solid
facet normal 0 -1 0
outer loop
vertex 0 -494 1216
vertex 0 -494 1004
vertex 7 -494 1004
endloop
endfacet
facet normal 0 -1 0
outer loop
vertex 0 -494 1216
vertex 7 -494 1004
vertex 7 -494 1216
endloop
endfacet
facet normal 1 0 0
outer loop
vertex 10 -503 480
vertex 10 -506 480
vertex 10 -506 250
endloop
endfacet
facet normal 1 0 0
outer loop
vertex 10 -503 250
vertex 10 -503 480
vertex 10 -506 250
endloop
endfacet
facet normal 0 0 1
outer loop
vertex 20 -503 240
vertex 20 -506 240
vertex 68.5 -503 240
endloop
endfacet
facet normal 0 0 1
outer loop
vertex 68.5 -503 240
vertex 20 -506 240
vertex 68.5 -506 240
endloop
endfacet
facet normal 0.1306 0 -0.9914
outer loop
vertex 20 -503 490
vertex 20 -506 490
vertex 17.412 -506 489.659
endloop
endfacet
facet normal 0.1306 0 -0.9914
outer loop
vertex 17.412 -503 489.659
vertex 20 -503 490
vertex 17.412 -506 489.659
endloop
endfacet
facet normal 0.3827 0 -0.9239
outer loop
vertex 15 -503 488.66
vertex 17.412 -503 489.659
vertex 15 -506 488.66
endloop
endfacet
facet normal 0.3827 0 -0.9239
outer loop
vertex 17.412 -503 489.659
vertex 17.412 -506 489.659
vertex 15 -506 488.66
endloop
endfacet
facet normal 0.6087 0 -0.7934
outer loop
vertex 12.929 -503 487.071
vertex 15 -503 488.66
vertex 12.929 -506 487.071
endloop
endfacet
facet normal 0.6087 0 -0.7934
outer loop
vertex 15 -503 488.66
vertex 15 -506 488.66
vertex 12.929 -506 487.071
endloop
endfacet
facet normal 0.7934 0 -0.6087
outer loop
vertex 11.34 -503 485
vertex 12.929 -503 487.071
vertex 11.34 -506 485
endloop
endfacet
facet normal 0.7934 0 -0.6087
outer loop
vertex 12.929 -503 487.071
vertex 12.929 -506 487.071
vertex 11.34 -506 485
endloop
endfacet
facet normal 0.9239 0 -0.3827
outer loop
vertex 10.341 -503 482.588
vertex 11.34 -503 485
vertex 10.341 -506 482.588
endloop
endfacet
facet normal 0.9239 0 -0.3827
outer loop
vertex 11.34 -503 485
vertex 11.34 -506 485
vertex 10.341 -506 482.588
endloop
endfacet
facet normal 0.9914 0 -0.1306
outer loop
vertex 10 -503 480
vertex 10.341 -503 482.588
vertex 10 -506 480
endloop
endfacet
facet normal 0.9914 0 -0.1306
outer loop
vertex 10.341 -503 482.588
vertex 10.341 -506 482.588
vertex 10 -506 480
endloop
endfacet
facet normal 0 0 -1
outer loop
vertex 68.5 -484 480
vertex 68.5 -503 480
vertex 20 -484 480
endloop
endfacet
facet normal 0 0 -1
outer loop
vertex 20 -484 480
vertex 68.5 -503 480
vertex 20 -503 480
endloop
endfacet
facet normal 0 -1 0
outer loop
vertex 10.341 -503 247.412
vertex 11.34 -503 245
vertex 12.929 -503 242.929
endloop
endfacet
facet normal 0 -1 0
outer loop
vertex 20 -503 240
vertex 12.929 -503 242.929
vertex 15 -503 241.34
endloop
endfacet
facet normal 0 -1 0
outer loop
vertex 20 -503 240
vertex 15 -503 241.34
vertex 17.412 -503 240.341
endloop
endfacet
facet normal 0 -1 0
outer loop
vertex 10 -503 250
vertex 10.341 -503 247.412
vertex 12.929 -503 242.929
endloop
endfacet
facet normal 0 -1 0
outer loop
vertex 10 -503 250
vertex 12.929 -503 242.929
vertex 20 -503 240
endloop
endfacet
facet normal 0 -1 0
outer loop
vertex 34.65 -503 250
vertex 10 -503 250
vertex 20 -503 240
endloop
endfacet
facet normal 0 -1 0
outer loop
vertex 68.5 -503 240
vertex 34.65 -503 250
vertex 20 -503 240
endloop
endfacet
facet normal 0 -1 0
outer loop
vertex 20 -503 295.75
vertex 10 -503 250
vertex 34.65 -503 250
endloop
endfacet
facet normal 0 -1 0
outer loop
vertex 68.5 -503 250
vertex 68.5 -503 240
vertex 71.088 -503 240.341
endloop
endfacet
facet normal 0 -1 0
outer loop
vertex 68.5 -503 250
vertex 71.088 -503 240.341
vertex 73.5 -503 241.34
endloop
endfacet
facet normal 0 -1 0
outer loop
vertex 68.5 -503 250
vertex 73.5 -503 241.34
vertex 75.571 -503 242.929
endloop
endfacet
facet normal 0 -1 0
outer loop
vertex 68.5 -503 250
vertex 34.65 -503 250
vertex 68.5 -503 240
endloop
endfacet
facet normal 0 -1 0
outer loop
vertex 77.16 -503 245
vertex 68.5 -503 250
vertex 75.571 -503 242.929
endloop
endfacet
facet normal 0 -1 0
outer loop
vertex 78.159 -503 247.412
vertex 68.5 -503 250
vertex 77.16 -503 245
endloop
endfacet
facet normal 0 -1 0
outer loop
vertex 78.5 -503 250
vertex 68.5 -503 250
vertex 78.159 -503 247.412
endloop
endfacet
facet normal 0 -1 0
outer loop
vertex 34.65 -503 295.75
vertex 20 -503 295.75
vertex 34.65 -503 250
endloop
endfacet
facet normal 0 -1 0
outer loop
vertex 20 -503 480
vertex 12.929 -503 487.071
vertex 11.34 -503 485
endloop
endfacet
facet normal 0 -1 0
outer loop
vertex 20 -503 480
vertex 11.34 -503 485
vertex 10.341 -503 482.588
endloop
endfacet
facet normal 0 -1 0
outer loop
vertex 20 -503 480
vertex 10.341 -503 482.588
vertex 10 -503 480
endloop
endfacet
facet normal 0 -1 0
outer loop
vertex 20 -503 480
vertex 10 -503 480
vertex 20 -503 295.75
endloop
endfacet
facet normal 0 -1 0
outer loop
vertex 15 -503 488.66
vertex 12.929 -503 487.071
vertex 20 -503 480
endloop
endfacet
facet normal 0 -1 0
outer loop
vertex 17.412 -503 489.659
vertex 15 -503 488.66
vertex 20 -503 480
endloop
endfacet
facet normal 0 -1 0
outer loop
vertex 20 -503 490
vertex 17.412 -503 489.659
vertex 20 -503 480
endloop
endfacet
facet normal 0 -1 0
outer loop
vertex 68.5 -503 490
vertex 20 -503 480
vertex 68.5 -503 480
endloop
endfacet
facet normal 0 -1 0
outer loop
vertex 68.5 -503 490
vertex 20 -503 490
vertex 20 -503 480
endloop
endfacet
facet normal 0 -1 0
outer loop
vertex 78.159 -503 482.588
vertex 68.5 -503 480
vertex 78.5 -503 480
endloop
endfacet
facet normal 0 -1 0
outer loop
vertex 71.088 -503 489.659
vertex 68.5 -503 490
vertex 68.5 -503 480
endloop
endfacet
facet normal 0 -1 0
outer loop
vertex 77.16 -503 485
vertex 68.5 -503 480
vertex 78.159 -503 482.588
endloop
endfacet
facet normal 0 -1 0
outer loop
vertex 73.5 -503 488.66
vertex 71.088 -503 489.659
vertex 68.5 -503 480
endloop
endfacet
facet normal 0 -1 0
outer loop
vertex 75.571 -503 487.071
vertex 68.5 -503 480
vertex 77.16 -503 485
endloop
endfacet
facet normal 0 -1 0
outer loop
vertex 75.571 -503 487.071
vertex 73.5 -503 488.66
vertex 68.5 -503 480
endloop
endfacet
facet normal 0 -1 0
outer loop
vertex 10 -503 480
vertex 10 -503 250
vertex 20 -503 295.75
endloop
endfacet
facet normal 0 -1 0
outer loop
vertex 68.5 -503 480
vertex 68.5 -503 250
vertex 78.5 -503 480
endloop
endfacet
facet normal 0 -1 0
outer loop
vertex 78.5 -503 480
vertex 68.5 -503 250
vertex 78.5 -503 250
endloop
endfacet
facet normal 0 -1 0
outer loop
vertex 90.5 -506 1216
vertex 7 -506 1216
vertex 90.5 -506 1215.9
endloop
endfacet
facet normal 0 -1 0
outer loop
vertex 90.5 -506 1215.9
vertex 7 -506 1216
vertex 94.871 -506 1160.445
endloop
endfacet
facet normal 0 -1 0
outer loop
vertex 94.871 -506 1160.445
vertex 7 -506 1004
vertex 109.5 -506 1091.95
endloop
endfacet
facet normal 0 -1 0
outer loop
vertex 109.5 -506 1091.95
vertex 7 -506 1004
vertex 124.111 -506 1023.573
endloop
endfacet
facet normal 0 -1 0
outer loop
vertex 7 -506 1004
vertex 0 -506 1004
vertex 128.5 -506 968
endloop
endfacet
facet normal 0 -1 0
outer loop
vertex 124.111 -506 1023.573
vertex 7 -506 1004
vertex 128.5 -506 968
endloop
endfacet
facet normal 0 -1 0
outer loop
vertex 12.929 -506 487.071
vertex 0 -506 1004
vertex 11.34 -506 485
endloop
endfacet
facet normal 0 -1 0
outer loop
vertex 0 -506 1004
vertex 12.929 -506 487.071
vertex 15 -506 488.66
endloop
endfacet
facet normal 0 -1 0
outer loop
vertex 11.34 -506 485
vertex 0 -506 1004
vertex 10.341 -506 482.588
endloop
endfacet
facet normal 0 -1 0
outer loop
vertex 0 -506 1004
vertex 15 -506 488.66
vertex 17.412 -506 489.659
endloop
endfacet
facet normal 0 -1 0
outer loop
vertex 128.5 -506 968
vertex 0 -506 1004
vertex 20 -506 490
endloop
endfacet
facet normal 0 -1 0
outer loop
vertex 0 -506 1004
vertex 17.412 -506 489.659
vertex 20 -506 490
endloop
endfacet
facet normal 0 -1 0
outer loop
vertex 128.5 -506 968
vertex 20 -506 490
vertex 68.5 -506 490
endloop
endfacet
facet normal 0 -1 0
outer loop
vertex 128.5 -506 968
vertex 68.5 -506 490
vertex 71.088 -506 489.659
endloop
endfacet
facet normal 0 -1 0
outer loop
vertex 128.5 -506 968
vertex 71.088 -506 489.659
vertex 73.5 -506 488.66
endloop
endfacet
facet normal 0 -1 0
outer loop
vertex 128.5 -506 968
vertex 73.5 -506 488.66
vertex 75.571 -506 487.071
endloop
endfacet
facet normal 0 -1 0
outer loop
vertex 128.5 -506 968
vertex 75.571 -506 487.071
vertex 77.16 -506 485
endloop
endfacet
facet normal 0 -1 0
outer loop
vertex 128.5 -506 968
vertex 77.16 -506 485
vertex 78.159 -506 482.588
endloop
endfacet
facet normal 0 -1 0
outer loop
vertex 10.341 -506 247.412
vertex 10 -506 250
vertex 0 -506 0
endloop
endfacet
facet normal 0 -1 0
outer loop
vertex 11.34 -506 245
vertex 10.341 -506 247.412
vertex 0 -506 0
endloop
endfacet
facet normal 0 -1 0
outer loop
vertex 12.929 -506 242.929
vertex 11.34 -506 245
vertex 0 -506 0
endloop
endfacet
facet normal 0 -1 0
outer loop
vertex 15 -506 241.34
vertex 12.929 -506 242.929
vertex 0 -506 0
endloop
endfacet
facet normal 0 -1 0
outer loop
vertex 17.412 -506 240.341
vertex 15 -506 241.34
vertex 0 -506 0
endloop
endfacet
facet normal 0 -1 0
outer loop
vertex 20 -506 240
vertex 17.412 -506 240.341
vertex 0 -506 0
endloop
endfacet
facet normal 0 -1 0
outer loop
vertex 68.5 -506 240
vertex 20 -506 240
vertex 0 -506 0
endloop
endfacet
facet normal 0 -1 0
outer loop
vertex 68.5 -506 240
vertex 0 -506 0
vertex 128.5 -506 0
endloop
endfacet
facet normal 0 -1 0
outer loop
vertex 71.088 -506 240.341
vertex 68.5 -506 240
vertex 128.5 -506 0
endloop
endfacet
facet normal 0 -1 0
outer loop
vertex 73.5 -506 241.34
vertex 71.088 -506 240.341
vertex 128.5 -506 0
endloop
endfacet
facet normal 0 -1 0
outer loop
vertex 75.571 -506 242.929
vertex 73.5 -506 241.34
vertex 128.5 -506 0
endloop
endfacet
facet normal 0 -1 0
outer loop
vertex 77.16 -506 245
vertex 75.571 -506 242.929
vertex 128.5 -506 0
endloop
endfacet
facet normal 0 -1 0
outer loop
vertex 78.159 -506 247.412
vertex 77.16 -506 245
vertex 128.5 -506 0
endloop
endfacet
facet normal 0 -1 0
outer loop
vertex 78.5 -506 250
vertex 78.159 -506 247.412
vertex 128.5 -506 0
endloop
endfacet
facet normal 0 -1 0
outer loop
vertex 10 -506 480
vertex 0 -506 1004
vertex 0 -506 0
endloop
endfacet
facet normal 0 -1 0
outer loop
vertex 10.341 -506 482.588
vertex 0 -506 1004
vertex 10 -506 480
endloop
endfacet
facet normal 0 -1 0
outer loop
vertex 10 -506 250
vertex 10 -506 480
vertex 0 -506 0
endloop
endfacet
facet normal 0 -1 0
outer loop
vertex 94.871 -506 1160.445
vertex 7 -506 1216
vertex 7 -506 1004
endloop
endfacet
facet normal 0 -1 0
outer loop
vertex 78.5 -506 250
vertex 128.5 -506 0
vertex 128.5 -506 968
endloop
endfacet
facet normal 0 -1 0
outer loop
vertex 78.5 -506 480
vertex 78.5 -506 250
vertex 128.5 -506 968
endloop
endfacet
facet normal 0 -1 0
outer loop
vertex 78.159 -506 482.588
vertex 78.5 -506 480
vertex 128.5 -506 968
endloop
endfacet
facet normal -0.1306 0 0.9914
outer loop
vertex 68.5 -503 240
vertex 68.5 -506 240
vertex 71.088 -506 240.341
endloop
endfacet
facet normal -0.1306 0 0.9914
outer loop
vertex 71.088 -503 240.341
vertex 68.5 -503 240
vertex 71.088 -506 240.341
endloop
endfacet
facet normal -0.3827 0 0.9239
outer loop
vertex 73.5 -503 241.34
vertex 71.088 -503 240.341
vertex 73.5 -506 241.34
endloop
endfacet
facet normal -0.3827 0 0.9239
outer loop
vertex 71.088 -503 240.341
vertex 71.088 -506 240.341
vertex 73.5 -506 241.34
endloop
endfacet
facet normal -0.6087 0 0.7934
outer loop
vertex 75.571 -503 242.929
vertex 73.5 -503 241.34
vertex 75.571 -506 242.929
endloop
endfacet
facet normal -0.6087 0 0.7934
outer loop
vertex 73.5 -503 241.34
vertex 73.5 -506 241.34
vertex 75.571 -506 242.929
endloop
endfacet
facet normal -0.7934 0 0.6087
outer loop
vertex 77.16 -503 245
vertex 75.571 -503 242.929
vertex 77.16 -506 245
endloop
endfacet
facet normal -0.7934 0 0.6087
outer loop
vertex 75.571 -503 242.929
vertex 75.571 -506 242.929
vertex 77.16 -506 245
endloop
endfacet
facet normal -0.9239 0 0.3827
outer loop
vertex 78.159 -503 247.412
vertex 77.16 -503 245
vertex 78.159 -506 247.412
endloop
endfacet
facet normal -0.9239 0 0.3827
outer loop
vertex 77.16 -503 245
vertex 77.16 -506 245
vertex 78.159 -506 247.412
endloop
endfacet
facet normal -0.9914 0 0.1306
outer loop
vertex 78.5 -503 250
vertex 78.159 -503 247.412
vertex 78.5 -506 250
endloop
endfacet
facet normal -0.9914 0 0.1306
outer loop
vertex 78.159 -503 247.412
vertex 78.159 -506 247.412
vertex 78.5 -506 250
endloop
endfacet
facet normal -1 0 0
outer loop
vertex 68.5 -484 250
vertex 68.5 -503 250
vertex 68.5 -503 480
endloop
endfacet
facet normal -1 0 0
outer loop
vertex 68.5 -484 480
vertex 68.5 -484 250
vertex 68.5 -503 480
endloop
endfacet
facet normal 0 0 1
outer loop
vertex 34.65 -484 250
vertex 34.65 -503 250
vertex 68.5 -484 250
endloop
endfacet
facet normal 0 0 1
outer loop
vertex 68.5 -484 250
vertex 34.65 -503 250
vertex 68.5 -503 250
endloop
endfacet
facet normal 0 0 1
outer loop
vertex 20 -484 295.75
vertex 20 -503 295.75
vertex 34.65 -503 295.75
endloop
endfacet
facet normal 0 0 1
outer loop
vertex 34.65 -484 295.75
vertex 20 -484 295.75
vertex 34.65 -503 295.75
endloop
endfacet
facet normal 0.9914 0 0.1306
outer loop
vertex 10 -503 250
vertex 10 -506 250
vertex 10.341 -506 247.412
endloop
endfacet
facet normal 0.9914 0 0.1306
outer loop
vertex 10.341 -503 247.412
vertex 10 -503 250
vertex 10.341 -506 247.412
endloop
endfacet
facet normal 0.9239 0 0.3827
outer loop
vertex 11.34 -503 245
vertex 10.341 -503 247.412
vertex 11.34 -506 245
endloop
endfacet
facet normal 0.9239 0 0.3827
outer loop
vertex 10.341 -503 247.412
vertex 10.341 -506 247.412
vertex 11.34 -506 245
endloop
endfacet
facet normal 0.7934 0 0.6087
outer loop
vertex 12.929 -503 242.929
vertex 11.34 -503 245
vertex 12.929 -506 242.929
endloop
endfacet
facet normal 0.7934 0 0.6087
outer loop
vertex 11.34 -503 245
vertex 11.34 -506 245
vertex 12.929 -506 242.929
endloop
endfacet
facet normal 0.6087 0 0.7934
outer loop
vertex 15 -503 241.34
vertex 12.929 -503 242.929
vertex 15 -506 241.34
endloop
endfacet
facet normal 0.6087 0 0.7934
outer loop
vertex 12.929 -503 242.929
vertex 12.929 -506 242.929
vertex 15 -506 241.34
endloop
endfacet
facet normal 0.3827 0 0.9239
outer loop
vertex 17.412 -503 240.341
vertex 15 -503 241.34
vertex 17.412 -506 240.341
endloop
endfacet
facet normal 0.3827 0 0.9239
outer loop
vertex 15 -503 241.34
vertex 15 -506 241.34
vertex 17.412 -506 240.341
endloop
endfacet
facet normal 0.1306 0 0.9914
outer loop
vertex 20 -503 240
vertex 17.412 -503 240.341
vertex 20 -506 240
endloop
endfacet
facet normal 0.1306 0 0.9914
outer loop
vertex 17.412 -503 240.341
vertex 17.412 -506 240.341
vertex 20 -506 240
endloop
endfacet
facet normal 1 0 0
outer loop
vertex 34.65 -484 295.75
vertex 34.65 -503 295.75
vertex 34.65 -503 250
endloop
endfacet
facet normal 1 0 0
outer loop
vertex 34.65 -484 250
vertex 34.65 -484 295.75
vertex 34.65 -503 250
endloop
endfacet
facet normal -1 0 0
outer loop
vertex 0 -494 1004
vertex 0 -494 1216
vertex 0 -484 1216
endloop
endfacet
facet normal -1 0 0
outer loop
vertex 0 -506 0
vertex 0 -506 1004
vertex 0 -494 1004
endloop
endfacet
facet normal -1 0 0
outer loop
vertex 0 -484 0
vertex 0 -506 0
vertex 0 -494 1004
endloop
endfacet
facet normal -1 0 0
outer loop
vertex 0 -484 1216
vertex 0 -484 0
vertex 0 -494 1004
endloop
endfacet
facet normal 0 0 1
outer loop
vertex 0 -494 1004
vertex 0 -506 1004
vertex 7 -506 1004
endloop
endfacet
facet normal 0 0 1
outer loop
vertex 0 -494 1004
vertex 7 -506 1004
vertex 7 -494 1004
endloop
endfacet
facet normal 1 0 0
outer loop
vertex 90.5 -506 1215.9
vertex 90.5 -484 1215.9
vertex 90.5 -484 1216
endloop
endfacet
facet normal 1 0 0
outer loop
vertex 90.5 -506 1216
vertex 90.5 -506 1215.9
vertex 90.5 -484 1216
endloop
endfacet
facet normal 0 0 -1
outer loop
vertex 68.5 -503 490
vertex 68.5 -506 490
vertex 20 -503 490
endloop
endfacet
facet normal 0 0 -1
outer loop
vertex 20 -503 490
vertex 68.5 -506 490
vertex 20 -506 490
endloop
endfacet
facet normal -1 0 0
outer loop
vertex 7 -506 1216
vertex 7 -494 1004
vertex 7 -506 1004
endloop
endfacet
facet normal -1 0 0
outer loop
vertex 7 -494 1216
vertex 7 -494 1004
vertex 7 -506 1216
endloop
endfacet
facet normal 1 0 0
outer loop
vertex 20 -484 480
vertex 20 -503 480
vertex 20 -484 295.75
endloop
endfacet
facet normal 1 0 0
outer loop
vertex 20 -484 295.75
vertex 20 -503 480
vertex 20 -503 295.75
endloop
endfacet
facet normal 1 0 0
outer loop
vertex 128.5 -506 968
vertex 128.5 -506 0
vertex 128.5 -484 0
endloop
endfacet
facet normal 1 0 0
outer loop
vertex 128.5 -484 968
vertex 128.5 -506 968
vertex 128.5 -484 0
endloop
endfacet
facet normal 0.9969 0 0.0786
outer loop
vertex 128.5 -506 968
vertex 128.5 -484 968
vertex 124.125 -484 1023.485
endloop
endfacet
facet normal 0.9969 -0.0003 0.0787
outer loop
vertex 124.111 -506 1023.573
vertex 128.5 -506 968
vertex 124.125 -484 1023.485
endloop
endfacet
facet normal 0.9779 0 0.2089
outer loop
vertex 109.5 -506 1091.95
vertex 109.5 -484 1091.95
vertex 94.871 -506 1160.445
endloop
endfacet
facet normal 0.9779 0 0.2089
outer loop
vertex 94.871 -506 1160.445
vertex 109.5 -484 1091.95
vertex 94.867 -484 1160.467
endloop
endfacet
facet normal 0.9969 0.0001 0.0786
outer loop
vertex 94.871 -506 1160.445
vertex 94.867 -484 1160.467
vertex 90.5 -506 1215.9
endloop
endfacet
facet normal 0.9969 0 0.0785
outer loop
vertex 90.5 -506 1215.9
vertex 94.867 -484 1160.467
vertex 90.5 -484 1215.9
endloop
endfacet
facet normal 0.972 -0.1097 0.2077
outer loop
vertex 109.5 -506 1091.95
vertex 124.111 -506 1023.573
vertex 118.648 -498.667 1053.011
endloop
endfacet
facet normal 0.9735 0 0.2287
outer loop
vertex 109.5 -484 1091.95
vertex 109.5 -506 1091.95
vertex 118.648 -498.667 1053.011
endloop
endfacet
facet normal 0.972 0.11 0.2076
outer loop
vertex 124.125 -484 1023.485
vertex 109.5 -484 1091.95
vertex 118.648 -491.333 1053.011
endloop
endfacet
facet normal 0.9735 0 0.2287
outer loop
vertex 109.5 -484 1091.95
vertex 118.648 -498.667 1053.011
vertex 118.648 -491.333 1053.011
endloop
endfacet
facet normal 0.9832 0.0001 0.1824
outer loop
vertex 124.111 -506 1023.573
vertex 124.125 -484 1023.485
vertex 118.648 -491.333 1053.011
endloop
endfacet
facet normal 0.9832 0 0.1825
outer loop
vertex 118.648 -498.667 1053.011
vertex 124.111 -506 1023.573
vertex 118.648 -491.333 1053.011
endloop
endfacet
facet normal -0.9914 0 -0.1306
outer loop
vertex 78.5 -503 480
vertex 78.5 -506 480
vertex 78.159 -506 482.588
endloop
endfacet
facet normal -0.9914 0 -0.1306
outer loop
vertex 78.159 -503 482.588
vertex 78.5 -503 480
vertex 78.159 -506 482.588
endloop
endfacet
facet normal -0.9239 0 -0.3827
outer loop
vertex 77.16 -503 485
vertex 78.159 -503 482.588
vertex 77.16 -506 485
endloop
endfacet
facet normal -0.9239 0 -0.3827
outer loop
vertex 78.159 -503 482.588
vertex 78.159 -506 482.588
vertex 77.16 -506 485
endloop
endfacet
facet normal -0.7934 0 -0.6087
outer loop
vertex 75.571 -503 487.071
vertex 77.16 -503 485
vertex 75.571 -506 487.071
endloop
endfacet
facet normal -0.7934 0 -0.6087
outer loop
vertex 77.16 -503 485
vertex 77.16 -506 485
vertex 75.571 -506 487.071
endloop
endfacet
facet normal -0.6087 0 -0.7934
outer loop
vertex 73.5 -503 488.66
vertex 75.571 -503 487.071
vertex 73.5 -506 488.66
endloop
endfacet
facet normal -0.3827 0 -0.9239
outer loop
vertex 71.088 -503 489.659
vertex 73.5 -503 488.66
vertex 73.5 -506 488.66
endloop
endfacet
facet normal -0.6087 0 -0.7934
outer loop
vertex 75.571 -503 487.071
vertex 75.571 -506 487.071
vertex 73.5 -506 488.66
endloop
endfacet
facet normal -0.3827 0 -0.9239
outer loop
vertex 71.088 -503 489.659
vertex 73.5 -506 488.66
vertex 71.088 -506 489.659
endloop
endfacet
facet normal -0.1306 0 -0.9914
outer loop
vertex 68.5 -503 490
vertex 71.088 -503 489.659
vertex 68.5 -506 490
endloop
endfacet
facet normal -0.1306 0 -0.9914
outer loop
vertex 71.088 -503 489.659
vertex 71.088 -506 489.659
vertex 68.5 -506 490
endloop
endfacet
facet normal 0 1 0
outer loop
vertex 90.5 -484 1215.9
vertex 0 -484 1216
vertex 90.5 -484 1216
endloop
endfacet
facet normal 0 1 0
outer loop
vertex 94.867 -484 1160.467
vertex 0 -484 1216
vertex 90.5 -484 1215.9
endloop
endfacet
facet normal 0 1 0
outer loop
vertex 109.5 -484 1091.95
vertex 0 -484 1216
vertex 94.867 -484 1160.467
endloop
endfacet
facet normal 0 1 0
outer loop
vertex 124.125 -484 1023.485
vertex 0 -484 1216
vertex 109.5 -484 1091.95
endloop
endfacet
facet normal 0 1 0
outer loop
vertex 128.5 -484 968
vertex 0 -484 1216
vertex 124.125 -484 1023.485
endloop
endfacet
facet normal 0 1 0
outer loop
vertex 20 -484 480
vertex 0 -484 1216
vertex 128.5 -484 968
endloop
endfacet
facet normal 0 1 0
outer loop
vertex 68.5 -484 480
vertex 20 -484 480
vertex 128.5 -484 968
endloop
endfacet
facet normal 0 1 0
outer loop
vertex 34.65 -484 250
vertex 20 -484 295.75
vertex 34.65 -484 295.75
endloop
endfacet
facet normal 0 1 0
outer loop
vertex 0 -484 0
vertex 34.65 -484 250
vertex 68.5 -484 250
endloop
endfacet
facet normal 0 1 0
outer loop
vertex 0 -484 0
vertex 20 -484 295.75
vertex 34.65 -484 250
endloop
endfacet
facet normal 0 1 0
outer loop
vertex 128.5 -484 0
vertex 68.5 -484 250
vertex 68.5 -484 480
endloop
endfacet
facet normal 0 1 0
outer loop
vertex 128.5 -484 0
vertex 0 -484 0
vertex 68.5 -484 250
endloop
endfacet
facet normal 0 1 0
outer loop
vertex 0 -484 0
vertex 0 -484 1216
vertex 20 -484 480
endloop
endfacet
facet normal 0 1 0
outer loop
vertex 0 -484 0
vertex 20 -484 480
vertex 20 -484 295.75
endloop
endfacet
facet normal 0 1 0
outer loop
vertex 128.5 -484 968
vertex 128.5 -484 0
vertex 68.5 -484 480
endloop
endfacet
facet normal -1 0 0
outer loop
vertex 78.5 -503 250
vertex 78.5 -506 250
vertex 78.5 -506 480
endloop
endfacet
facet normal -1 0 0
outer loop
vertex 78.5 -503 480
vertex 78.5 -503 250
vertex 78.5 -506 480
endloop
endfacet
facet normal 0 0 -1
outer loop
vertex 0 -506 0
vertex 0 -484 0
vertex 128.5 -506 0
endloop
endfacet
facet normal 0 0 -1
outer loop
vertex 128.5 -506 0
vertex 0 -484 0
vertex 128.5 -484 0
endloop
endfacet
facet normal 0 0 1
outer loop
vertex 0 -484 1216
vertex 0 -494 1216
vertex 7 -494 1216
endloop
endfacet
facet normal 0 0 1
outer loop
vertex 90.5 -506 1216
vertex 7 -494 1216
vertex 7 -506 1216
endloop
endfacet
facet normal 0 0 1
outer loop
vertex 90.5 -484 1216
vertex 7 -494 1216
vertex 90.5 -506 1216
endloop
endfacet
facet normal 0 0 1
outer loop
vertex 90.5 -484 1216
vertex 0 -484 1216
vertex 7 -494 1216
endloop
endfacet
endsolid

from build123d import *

# Parameters (mm, degrees)
ESQUISSE1_W             = 128.5
ESQUISSE1_H             = 22
BOSS_EXTRU_1_DEPTH      = 1216
ENL_V_MAT_EXTRU_1_DEPTH = 23
ESQUISSE5_W             = 212
ESQUISSE5_H             = 12
ENL_V_MAT_EXTRU_2_DEPTH = 7
ENL_V_MAT_EXTRU_3_DEPTH = 3
ENL_V_MAT_EXTRU_4_DEPTH = 20.0000001


with BuildPart() as part:
    # Esquisse1 → Boss.-Extru.1 (new body)
    with BuildSketch(Plane.XY):
        with Locations((64.25, -495)):
            Rectangle(ESQUISSE1_W, ESQUISSE1_H)
    extrude(amount=BOSS_EXTRU_1_DEPTH)

    # Esquisse4 → Enlèv. mat.-Extru.1 (cut, through all)
    with BuildSketch(Plane(origin=(0, -484, 0), x_dir=(1, 0, 0), z_dir=(0, 1, 0))):
        with BuildLine():
            Line((90.5, -1215.9), (90.5, -1216))
            Line((90.5, -1216), (128.5, -1216))
            Line((128.5, -1216), (128.5, -968))
            add(Edge.make_bspline(
                [(128.5, -968), (128.5, -1061.333333333), (90.5, -1122.566666667), (90.5, -1215.9)],
                knots=[0, 0, 0, 0, 1, 1, 1, 1], degree=3))
        make_face()
    extrude(amount=-ENL_V_MAT_EXTRU_1_DEPTH, mode=Mode.SUBTRACT)

    # Esquisse5 → Enlèv. mat.-Extru.2 (cut)
    with BuildSketch(Plane.ZY):
        with Locations((1110, -500)):
            Rectangle(ESQUISSE5_W, ESQUISSE5_H)
    extrude(amount=-ENL_V_MAT_EXTRU_2_DEPTH, mode=Mode.SUBTRACT)

    # Esquisse6 → Enlèv. mat.-Extru.3 (cut)
    with BuildSketch(Plane.XZ.offset(506)):
        with BuildLine():
            Line((10, 480), (10, 250))
            ThreePointArc((10, 250), (12.928932188, 242.928932188), (20, 240))
            Line((20, 240), (68.5, 240))
            ThreePointArc((68.5, 240), (75.571067812, 242.928932188), (78.5, 250))
            Line((78.5, 250), (78.5, 480))
            ThreePointArc((78.5, 480), (75.571067812, 487.071067812), (68.5, 490))
            Line((68.5, 490), (20, 490))
            ThreePointArc((20, 490), (12.928932188, 487.071067812), (10, 480))
        make_face()
    extrude(amount=-ENL_V_MAT_EXTRU_3_DEPTH, mode=Mode.SUBTRACT)

    # Esquisse11 → Enlèv. mat.-Extru.4 (cut, through all)
    with BuildSketch(Plane.XZ.offset(503)):
        Polygon((68.5, 480), (20, 480), (20, 295.75), (34.65, 295.75), (34.65, 250), (68.5, 250), align=None)
    extrude(amount=-ENL_V_MAT_EXTRU_4_DEPTH, mode=Mode.SUBTRACT)


solid = part.part
